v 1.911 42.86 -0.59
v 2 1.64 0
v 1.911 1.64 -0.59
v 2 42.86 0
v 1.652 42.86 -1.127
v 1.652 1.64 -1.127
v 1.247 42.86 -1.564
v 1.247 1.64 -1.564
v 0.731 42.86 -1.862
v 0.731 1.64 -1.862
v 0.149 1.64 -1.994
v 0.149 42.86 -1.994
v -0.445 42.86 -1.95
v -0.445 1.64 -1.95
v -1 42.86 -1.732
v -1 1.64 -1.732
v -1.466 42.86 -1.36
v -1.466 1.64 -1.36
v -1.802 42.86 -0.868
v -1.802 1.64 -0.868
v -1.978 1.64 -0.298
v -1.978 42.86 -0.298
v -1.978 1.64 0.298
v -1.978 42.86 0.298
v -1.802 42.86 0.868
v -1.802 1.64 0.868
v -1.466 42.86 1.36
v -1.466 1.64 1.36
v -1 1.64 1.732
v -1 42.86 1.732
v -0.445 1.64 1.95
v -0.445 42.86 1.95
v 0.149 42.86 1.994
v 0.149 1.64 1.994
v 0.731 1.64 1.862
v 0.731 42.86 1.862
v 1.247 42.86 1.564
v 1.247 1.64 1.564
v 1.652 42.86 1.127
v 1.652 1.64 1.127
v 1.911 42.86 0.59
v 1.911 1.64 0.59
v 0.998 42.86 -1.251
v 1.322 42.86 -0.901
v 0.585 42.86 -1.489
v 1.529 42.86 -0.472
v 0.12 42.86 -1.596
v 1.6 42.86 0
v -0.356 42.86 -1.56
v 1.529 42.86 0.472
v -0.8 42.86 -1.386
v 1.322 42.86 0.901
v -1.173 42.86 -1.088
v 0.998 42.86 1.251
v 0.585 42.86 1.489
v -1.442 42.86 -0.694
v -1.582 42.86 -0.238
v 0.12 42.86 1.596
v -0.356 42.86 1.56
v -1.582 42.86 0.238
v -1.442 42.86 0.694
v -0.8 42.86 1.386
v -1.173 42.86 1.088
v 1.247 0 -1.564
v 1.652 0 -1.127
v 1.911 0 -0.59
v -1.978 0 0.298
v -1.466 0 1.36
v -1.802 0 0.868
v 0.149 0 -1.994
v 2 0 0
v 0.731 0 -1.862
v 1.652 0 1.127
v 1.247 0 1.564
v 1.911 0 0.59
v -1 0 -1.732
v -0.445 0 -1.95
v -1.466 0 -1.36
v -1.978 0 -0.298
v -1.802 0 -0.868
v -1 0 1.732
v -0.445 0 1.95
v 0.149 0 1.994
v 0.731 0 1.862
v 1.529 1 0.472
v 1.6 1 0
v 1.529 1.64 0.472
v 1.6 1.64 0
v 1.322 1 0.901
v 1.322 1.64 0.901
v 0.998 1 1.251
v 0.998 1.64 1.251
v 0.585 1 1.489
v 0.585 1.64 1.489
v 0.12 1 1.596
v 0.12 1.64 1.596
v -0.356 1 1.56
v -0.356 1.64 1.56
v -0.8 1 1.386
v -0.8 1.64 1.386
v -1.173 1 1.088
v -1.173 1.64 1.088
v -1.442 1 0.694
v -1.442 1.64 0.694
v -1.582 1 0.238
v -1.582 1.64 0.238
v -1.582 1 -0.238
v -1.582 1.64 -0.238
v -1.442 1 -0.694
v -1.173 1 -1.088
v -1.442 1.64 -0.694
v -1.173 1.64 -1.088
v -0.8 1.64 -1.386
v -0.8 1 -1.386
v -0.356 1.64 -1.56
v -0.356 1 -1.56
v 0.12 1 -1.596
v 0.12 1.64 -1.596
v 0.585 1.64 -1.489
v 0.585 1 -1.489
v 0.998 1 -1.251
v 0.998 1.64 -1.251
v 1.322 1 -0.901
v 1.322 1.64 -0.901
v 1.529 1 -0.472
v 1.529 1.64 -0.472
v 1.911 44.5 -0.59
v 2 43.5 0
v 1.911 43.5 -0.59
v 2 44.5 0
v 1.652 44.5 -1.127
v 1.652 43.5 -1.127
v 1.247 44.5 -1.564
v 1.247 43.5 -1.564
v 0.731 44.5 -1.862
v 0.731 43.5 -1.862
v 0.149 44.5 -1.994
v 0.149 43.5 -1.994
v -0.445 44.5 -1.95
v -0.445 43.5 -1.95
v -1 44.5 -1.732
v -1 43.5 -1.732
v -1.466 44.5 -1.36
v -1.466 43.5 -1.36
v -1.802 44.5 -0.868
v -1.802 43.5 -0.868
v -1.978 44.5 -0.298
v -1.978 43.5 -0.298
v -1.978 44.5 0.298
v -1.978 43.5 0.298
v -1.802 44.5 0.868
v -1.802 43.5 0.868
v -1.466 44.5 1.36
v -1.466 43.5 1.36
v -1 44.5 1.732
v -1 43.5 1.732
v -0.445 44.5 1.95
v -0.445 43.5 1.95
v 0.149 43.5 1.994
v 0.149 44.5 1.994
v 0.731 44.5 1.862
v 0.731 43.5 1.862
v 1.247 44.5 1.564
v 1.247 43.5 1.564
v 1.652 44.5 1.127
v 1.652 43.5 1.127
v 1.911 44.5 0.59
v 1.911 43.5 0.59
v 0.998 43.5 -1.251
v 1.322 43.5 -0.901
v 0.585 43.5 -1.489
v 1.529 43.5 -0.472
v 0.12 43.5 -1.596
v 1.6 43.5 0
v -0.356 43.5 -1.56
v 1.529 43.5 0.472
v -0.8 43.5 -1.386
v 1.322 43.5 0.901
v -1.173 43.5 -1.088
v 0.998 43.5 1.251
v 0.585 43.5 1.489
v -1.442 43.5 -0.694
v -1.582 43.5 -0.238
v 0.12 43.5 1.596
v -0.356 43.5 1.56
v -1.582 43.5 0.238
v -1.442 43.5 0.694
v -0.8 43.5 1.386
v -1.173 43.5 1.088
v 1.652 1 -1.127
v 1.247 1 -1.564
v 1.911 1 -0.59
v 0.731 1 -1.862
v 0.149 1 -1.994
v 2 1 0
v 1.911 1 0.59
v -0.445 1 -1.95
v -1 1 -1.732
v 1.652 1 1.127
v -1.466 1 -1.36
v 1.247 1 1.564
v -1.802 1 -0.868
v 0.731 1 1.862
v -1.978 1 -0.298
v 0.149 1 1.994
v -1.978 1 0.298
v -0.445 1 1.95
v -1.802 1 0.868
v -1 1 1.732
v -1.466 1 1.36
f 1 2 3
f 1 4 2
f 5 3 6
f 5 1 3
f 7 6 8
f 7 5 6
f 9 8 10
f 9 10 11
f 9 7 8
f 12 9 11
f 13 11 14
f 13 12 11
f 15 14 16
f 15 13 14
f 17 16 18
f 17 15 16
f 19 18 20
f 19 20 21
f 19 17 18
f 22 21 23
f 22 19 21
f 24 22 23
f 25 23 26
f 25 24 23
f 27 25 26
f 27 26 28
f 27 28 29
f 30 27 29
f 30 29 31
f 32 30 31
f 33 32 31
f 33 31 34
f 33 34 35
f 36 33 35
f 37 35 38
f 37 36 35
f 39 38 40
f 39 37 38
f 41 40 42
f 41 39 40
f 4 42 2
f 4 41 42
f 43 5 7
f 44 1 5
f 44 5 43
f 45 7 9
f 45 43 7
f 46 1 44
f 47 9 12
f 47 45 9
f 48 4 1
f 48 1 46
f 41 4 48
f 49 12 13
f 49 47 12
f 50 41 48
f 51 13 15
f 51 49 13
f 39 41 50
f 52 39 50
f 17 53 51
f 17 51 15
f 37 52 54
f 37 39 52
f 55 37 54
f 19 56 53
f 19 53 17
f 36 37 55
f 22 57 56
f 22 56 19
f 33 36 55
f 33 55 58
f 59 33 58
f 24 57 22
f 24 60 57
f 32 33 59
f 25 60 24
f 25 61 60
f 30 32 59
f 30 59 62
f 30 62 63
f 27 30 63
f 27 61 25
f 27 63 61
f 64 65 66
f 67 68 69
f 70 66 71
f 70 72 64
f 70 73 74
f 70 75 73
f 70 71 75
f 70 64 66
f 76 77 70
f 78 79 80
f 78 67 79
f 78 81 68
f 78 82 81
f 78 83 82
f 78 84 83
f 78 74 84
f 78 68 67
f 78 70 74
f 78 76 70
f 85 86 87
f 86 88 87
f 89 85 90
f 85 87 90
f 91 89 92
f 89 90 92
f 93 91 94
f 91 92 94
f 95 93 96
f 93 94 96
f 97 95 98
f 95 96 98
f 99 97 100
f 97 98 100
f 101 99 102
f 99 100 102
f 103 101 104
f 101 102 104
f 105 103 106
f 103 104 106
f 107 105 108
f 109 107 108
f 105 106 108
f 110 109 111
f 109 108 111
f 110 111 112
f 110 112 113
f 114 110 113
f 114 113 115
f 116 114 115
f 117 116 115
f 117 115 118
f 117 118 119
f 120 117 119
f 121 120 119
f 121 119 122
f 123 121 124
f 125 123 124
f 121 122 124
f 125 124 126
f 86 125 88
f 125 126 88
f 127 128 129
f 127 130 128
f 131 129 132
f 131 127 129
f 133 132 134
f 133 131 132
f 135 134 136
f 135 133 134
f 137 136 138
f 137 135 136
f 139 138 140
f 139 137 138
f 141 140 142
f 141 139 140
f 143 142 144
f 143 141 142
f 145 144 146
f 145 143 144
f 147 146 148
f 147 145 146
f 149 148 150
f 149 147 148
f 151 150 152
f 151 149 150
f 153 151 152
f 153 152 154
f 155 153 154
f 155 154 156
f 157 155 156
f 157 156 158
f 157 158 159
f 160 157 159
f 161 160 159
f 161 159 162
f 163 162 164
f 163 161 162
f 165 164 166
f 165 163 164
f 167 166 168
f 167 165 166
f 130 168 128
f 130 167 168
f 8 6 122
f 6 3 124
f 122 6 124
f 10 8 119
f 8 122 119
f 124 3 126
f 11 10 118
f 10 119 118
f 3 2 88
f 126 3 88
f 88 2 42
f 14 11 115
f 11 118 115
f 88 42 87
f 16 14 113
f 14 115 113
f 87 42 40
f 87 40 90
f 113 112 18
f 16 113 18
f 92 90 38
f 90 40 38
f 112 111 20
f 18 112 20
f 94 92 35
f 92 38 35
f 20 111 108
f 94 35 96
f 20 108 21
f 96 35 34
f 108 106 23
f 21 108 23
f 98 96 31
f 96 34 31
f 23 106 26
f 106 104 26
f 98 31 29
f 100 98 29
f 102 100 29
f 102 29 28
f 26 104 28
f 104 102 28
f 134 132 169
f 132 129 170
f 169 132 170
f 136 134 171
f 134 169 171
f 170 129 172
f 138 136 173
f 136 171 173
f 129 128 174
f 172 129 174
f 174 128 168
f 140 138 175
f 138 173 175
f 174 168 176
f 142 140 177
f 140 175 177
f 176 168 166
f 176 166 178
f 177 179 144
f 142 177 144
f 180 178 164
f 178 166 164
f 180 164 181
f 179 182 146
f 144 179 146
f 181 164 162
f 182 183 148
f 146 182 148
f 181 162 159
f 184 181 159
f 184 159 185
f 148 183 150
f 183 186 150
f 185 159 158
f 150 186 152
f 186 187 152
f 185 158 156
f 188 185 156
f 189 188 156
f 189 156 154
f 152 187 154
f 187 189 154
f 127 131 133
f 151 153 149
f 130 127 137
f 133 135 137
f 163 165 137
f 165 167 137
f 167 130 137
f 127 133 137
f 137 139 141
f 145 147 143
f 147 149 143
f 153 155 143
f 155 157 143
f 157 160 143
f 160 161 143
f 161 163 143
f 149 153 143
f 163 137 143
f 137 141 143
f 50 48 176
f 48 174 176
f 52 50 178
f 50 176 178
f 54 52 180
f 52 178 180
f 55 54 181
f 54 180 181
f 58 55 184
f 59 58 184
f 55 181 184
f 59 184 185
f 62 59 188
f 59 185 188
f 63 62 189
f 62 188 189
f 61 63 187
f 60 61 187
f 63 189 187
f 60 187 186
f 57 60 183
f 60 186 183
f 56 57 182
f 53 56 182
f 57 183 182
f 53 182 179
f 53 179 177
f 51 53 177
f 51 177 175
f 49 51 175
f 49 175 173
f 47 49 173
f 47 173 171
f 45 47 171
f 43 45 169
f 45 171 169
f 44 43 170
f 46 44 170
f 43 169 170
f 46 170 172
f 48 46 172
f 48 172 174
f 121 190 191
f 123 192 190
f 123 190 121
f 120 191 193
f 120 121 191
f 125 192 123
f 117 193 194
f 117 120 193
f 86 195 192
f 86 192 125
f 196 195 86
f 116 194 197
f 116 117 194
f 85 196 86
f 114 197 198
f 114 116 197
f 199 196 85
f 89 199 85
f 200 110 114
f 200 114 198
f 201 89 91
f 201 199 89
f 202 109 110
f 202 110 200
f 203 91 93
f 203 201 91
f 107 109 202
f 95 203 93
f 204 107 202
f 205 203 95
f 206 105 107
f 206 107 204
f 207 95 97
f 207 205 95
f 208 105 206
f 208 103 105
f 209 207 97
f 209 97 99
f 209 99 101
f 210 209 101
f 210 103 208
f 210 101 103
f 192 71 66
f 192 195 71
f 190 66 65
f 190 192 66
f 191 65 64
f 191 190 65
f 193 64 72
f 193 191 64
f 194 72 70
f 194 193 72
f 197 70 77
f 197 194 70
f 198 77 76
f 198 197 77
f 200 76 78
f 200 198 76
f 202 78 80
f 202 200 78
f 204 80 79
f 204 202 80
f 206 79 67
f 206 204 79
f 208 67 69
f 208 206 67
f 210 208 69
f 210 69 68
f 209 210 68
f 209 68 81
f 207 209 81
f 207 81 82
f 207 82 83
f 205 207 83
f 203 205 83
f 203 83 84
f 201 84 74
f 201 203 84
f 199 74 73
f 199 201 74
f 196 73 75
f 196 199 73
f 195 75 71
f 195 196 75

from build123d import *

# Parameters (mm, degrees)
SKETCH1_W   = 2
SKETCH1_H   = 44.5
ESQUISSE1_W = 0.574838605
ESQUISSE1_H = 0.64
ESQUISSE3_W = 1.093459546
ESQUISSE3_H = 0.64


with BuildPart() as part:
    # Sketch1 → Revolve1 (revolve)
    with BuildSketch(Plane.XY):
        with Locations((1, 22.25)):
            Rectangle(SKETCH1_W, SKETCH1_H)
    revolve(axis=Axis((0, 0, 0), (0, 1, 0)))

    # Esquisse1 → Enlèvement de matière-Révolution1 (revolve, cut)
    with BuildSketch(Plane.XY):
        with Locations((1.887419303, 43.18)):
            Rectangle(ESQUISSE1_W, ESQUISSE1_H)
    revolve(axis=Axis((0, 44.5, 0), (0, -1, 0)), mode=Mode.SUBTRACT)

    # Esquisse3 → Enlèvement de matière-Révolution3 (revolve, cut)
    with BuildSketch(Plane.XY):
        with Locations((2.146729773, 1.32)):
            Rectangle(ESQUISSE3_W, ESQUISSE3_H)
    revolve(axis=Axis((0, 44.5, 0), (0, -1, 0)), mode=Mode.SUBTRACT)


solid = part.part
